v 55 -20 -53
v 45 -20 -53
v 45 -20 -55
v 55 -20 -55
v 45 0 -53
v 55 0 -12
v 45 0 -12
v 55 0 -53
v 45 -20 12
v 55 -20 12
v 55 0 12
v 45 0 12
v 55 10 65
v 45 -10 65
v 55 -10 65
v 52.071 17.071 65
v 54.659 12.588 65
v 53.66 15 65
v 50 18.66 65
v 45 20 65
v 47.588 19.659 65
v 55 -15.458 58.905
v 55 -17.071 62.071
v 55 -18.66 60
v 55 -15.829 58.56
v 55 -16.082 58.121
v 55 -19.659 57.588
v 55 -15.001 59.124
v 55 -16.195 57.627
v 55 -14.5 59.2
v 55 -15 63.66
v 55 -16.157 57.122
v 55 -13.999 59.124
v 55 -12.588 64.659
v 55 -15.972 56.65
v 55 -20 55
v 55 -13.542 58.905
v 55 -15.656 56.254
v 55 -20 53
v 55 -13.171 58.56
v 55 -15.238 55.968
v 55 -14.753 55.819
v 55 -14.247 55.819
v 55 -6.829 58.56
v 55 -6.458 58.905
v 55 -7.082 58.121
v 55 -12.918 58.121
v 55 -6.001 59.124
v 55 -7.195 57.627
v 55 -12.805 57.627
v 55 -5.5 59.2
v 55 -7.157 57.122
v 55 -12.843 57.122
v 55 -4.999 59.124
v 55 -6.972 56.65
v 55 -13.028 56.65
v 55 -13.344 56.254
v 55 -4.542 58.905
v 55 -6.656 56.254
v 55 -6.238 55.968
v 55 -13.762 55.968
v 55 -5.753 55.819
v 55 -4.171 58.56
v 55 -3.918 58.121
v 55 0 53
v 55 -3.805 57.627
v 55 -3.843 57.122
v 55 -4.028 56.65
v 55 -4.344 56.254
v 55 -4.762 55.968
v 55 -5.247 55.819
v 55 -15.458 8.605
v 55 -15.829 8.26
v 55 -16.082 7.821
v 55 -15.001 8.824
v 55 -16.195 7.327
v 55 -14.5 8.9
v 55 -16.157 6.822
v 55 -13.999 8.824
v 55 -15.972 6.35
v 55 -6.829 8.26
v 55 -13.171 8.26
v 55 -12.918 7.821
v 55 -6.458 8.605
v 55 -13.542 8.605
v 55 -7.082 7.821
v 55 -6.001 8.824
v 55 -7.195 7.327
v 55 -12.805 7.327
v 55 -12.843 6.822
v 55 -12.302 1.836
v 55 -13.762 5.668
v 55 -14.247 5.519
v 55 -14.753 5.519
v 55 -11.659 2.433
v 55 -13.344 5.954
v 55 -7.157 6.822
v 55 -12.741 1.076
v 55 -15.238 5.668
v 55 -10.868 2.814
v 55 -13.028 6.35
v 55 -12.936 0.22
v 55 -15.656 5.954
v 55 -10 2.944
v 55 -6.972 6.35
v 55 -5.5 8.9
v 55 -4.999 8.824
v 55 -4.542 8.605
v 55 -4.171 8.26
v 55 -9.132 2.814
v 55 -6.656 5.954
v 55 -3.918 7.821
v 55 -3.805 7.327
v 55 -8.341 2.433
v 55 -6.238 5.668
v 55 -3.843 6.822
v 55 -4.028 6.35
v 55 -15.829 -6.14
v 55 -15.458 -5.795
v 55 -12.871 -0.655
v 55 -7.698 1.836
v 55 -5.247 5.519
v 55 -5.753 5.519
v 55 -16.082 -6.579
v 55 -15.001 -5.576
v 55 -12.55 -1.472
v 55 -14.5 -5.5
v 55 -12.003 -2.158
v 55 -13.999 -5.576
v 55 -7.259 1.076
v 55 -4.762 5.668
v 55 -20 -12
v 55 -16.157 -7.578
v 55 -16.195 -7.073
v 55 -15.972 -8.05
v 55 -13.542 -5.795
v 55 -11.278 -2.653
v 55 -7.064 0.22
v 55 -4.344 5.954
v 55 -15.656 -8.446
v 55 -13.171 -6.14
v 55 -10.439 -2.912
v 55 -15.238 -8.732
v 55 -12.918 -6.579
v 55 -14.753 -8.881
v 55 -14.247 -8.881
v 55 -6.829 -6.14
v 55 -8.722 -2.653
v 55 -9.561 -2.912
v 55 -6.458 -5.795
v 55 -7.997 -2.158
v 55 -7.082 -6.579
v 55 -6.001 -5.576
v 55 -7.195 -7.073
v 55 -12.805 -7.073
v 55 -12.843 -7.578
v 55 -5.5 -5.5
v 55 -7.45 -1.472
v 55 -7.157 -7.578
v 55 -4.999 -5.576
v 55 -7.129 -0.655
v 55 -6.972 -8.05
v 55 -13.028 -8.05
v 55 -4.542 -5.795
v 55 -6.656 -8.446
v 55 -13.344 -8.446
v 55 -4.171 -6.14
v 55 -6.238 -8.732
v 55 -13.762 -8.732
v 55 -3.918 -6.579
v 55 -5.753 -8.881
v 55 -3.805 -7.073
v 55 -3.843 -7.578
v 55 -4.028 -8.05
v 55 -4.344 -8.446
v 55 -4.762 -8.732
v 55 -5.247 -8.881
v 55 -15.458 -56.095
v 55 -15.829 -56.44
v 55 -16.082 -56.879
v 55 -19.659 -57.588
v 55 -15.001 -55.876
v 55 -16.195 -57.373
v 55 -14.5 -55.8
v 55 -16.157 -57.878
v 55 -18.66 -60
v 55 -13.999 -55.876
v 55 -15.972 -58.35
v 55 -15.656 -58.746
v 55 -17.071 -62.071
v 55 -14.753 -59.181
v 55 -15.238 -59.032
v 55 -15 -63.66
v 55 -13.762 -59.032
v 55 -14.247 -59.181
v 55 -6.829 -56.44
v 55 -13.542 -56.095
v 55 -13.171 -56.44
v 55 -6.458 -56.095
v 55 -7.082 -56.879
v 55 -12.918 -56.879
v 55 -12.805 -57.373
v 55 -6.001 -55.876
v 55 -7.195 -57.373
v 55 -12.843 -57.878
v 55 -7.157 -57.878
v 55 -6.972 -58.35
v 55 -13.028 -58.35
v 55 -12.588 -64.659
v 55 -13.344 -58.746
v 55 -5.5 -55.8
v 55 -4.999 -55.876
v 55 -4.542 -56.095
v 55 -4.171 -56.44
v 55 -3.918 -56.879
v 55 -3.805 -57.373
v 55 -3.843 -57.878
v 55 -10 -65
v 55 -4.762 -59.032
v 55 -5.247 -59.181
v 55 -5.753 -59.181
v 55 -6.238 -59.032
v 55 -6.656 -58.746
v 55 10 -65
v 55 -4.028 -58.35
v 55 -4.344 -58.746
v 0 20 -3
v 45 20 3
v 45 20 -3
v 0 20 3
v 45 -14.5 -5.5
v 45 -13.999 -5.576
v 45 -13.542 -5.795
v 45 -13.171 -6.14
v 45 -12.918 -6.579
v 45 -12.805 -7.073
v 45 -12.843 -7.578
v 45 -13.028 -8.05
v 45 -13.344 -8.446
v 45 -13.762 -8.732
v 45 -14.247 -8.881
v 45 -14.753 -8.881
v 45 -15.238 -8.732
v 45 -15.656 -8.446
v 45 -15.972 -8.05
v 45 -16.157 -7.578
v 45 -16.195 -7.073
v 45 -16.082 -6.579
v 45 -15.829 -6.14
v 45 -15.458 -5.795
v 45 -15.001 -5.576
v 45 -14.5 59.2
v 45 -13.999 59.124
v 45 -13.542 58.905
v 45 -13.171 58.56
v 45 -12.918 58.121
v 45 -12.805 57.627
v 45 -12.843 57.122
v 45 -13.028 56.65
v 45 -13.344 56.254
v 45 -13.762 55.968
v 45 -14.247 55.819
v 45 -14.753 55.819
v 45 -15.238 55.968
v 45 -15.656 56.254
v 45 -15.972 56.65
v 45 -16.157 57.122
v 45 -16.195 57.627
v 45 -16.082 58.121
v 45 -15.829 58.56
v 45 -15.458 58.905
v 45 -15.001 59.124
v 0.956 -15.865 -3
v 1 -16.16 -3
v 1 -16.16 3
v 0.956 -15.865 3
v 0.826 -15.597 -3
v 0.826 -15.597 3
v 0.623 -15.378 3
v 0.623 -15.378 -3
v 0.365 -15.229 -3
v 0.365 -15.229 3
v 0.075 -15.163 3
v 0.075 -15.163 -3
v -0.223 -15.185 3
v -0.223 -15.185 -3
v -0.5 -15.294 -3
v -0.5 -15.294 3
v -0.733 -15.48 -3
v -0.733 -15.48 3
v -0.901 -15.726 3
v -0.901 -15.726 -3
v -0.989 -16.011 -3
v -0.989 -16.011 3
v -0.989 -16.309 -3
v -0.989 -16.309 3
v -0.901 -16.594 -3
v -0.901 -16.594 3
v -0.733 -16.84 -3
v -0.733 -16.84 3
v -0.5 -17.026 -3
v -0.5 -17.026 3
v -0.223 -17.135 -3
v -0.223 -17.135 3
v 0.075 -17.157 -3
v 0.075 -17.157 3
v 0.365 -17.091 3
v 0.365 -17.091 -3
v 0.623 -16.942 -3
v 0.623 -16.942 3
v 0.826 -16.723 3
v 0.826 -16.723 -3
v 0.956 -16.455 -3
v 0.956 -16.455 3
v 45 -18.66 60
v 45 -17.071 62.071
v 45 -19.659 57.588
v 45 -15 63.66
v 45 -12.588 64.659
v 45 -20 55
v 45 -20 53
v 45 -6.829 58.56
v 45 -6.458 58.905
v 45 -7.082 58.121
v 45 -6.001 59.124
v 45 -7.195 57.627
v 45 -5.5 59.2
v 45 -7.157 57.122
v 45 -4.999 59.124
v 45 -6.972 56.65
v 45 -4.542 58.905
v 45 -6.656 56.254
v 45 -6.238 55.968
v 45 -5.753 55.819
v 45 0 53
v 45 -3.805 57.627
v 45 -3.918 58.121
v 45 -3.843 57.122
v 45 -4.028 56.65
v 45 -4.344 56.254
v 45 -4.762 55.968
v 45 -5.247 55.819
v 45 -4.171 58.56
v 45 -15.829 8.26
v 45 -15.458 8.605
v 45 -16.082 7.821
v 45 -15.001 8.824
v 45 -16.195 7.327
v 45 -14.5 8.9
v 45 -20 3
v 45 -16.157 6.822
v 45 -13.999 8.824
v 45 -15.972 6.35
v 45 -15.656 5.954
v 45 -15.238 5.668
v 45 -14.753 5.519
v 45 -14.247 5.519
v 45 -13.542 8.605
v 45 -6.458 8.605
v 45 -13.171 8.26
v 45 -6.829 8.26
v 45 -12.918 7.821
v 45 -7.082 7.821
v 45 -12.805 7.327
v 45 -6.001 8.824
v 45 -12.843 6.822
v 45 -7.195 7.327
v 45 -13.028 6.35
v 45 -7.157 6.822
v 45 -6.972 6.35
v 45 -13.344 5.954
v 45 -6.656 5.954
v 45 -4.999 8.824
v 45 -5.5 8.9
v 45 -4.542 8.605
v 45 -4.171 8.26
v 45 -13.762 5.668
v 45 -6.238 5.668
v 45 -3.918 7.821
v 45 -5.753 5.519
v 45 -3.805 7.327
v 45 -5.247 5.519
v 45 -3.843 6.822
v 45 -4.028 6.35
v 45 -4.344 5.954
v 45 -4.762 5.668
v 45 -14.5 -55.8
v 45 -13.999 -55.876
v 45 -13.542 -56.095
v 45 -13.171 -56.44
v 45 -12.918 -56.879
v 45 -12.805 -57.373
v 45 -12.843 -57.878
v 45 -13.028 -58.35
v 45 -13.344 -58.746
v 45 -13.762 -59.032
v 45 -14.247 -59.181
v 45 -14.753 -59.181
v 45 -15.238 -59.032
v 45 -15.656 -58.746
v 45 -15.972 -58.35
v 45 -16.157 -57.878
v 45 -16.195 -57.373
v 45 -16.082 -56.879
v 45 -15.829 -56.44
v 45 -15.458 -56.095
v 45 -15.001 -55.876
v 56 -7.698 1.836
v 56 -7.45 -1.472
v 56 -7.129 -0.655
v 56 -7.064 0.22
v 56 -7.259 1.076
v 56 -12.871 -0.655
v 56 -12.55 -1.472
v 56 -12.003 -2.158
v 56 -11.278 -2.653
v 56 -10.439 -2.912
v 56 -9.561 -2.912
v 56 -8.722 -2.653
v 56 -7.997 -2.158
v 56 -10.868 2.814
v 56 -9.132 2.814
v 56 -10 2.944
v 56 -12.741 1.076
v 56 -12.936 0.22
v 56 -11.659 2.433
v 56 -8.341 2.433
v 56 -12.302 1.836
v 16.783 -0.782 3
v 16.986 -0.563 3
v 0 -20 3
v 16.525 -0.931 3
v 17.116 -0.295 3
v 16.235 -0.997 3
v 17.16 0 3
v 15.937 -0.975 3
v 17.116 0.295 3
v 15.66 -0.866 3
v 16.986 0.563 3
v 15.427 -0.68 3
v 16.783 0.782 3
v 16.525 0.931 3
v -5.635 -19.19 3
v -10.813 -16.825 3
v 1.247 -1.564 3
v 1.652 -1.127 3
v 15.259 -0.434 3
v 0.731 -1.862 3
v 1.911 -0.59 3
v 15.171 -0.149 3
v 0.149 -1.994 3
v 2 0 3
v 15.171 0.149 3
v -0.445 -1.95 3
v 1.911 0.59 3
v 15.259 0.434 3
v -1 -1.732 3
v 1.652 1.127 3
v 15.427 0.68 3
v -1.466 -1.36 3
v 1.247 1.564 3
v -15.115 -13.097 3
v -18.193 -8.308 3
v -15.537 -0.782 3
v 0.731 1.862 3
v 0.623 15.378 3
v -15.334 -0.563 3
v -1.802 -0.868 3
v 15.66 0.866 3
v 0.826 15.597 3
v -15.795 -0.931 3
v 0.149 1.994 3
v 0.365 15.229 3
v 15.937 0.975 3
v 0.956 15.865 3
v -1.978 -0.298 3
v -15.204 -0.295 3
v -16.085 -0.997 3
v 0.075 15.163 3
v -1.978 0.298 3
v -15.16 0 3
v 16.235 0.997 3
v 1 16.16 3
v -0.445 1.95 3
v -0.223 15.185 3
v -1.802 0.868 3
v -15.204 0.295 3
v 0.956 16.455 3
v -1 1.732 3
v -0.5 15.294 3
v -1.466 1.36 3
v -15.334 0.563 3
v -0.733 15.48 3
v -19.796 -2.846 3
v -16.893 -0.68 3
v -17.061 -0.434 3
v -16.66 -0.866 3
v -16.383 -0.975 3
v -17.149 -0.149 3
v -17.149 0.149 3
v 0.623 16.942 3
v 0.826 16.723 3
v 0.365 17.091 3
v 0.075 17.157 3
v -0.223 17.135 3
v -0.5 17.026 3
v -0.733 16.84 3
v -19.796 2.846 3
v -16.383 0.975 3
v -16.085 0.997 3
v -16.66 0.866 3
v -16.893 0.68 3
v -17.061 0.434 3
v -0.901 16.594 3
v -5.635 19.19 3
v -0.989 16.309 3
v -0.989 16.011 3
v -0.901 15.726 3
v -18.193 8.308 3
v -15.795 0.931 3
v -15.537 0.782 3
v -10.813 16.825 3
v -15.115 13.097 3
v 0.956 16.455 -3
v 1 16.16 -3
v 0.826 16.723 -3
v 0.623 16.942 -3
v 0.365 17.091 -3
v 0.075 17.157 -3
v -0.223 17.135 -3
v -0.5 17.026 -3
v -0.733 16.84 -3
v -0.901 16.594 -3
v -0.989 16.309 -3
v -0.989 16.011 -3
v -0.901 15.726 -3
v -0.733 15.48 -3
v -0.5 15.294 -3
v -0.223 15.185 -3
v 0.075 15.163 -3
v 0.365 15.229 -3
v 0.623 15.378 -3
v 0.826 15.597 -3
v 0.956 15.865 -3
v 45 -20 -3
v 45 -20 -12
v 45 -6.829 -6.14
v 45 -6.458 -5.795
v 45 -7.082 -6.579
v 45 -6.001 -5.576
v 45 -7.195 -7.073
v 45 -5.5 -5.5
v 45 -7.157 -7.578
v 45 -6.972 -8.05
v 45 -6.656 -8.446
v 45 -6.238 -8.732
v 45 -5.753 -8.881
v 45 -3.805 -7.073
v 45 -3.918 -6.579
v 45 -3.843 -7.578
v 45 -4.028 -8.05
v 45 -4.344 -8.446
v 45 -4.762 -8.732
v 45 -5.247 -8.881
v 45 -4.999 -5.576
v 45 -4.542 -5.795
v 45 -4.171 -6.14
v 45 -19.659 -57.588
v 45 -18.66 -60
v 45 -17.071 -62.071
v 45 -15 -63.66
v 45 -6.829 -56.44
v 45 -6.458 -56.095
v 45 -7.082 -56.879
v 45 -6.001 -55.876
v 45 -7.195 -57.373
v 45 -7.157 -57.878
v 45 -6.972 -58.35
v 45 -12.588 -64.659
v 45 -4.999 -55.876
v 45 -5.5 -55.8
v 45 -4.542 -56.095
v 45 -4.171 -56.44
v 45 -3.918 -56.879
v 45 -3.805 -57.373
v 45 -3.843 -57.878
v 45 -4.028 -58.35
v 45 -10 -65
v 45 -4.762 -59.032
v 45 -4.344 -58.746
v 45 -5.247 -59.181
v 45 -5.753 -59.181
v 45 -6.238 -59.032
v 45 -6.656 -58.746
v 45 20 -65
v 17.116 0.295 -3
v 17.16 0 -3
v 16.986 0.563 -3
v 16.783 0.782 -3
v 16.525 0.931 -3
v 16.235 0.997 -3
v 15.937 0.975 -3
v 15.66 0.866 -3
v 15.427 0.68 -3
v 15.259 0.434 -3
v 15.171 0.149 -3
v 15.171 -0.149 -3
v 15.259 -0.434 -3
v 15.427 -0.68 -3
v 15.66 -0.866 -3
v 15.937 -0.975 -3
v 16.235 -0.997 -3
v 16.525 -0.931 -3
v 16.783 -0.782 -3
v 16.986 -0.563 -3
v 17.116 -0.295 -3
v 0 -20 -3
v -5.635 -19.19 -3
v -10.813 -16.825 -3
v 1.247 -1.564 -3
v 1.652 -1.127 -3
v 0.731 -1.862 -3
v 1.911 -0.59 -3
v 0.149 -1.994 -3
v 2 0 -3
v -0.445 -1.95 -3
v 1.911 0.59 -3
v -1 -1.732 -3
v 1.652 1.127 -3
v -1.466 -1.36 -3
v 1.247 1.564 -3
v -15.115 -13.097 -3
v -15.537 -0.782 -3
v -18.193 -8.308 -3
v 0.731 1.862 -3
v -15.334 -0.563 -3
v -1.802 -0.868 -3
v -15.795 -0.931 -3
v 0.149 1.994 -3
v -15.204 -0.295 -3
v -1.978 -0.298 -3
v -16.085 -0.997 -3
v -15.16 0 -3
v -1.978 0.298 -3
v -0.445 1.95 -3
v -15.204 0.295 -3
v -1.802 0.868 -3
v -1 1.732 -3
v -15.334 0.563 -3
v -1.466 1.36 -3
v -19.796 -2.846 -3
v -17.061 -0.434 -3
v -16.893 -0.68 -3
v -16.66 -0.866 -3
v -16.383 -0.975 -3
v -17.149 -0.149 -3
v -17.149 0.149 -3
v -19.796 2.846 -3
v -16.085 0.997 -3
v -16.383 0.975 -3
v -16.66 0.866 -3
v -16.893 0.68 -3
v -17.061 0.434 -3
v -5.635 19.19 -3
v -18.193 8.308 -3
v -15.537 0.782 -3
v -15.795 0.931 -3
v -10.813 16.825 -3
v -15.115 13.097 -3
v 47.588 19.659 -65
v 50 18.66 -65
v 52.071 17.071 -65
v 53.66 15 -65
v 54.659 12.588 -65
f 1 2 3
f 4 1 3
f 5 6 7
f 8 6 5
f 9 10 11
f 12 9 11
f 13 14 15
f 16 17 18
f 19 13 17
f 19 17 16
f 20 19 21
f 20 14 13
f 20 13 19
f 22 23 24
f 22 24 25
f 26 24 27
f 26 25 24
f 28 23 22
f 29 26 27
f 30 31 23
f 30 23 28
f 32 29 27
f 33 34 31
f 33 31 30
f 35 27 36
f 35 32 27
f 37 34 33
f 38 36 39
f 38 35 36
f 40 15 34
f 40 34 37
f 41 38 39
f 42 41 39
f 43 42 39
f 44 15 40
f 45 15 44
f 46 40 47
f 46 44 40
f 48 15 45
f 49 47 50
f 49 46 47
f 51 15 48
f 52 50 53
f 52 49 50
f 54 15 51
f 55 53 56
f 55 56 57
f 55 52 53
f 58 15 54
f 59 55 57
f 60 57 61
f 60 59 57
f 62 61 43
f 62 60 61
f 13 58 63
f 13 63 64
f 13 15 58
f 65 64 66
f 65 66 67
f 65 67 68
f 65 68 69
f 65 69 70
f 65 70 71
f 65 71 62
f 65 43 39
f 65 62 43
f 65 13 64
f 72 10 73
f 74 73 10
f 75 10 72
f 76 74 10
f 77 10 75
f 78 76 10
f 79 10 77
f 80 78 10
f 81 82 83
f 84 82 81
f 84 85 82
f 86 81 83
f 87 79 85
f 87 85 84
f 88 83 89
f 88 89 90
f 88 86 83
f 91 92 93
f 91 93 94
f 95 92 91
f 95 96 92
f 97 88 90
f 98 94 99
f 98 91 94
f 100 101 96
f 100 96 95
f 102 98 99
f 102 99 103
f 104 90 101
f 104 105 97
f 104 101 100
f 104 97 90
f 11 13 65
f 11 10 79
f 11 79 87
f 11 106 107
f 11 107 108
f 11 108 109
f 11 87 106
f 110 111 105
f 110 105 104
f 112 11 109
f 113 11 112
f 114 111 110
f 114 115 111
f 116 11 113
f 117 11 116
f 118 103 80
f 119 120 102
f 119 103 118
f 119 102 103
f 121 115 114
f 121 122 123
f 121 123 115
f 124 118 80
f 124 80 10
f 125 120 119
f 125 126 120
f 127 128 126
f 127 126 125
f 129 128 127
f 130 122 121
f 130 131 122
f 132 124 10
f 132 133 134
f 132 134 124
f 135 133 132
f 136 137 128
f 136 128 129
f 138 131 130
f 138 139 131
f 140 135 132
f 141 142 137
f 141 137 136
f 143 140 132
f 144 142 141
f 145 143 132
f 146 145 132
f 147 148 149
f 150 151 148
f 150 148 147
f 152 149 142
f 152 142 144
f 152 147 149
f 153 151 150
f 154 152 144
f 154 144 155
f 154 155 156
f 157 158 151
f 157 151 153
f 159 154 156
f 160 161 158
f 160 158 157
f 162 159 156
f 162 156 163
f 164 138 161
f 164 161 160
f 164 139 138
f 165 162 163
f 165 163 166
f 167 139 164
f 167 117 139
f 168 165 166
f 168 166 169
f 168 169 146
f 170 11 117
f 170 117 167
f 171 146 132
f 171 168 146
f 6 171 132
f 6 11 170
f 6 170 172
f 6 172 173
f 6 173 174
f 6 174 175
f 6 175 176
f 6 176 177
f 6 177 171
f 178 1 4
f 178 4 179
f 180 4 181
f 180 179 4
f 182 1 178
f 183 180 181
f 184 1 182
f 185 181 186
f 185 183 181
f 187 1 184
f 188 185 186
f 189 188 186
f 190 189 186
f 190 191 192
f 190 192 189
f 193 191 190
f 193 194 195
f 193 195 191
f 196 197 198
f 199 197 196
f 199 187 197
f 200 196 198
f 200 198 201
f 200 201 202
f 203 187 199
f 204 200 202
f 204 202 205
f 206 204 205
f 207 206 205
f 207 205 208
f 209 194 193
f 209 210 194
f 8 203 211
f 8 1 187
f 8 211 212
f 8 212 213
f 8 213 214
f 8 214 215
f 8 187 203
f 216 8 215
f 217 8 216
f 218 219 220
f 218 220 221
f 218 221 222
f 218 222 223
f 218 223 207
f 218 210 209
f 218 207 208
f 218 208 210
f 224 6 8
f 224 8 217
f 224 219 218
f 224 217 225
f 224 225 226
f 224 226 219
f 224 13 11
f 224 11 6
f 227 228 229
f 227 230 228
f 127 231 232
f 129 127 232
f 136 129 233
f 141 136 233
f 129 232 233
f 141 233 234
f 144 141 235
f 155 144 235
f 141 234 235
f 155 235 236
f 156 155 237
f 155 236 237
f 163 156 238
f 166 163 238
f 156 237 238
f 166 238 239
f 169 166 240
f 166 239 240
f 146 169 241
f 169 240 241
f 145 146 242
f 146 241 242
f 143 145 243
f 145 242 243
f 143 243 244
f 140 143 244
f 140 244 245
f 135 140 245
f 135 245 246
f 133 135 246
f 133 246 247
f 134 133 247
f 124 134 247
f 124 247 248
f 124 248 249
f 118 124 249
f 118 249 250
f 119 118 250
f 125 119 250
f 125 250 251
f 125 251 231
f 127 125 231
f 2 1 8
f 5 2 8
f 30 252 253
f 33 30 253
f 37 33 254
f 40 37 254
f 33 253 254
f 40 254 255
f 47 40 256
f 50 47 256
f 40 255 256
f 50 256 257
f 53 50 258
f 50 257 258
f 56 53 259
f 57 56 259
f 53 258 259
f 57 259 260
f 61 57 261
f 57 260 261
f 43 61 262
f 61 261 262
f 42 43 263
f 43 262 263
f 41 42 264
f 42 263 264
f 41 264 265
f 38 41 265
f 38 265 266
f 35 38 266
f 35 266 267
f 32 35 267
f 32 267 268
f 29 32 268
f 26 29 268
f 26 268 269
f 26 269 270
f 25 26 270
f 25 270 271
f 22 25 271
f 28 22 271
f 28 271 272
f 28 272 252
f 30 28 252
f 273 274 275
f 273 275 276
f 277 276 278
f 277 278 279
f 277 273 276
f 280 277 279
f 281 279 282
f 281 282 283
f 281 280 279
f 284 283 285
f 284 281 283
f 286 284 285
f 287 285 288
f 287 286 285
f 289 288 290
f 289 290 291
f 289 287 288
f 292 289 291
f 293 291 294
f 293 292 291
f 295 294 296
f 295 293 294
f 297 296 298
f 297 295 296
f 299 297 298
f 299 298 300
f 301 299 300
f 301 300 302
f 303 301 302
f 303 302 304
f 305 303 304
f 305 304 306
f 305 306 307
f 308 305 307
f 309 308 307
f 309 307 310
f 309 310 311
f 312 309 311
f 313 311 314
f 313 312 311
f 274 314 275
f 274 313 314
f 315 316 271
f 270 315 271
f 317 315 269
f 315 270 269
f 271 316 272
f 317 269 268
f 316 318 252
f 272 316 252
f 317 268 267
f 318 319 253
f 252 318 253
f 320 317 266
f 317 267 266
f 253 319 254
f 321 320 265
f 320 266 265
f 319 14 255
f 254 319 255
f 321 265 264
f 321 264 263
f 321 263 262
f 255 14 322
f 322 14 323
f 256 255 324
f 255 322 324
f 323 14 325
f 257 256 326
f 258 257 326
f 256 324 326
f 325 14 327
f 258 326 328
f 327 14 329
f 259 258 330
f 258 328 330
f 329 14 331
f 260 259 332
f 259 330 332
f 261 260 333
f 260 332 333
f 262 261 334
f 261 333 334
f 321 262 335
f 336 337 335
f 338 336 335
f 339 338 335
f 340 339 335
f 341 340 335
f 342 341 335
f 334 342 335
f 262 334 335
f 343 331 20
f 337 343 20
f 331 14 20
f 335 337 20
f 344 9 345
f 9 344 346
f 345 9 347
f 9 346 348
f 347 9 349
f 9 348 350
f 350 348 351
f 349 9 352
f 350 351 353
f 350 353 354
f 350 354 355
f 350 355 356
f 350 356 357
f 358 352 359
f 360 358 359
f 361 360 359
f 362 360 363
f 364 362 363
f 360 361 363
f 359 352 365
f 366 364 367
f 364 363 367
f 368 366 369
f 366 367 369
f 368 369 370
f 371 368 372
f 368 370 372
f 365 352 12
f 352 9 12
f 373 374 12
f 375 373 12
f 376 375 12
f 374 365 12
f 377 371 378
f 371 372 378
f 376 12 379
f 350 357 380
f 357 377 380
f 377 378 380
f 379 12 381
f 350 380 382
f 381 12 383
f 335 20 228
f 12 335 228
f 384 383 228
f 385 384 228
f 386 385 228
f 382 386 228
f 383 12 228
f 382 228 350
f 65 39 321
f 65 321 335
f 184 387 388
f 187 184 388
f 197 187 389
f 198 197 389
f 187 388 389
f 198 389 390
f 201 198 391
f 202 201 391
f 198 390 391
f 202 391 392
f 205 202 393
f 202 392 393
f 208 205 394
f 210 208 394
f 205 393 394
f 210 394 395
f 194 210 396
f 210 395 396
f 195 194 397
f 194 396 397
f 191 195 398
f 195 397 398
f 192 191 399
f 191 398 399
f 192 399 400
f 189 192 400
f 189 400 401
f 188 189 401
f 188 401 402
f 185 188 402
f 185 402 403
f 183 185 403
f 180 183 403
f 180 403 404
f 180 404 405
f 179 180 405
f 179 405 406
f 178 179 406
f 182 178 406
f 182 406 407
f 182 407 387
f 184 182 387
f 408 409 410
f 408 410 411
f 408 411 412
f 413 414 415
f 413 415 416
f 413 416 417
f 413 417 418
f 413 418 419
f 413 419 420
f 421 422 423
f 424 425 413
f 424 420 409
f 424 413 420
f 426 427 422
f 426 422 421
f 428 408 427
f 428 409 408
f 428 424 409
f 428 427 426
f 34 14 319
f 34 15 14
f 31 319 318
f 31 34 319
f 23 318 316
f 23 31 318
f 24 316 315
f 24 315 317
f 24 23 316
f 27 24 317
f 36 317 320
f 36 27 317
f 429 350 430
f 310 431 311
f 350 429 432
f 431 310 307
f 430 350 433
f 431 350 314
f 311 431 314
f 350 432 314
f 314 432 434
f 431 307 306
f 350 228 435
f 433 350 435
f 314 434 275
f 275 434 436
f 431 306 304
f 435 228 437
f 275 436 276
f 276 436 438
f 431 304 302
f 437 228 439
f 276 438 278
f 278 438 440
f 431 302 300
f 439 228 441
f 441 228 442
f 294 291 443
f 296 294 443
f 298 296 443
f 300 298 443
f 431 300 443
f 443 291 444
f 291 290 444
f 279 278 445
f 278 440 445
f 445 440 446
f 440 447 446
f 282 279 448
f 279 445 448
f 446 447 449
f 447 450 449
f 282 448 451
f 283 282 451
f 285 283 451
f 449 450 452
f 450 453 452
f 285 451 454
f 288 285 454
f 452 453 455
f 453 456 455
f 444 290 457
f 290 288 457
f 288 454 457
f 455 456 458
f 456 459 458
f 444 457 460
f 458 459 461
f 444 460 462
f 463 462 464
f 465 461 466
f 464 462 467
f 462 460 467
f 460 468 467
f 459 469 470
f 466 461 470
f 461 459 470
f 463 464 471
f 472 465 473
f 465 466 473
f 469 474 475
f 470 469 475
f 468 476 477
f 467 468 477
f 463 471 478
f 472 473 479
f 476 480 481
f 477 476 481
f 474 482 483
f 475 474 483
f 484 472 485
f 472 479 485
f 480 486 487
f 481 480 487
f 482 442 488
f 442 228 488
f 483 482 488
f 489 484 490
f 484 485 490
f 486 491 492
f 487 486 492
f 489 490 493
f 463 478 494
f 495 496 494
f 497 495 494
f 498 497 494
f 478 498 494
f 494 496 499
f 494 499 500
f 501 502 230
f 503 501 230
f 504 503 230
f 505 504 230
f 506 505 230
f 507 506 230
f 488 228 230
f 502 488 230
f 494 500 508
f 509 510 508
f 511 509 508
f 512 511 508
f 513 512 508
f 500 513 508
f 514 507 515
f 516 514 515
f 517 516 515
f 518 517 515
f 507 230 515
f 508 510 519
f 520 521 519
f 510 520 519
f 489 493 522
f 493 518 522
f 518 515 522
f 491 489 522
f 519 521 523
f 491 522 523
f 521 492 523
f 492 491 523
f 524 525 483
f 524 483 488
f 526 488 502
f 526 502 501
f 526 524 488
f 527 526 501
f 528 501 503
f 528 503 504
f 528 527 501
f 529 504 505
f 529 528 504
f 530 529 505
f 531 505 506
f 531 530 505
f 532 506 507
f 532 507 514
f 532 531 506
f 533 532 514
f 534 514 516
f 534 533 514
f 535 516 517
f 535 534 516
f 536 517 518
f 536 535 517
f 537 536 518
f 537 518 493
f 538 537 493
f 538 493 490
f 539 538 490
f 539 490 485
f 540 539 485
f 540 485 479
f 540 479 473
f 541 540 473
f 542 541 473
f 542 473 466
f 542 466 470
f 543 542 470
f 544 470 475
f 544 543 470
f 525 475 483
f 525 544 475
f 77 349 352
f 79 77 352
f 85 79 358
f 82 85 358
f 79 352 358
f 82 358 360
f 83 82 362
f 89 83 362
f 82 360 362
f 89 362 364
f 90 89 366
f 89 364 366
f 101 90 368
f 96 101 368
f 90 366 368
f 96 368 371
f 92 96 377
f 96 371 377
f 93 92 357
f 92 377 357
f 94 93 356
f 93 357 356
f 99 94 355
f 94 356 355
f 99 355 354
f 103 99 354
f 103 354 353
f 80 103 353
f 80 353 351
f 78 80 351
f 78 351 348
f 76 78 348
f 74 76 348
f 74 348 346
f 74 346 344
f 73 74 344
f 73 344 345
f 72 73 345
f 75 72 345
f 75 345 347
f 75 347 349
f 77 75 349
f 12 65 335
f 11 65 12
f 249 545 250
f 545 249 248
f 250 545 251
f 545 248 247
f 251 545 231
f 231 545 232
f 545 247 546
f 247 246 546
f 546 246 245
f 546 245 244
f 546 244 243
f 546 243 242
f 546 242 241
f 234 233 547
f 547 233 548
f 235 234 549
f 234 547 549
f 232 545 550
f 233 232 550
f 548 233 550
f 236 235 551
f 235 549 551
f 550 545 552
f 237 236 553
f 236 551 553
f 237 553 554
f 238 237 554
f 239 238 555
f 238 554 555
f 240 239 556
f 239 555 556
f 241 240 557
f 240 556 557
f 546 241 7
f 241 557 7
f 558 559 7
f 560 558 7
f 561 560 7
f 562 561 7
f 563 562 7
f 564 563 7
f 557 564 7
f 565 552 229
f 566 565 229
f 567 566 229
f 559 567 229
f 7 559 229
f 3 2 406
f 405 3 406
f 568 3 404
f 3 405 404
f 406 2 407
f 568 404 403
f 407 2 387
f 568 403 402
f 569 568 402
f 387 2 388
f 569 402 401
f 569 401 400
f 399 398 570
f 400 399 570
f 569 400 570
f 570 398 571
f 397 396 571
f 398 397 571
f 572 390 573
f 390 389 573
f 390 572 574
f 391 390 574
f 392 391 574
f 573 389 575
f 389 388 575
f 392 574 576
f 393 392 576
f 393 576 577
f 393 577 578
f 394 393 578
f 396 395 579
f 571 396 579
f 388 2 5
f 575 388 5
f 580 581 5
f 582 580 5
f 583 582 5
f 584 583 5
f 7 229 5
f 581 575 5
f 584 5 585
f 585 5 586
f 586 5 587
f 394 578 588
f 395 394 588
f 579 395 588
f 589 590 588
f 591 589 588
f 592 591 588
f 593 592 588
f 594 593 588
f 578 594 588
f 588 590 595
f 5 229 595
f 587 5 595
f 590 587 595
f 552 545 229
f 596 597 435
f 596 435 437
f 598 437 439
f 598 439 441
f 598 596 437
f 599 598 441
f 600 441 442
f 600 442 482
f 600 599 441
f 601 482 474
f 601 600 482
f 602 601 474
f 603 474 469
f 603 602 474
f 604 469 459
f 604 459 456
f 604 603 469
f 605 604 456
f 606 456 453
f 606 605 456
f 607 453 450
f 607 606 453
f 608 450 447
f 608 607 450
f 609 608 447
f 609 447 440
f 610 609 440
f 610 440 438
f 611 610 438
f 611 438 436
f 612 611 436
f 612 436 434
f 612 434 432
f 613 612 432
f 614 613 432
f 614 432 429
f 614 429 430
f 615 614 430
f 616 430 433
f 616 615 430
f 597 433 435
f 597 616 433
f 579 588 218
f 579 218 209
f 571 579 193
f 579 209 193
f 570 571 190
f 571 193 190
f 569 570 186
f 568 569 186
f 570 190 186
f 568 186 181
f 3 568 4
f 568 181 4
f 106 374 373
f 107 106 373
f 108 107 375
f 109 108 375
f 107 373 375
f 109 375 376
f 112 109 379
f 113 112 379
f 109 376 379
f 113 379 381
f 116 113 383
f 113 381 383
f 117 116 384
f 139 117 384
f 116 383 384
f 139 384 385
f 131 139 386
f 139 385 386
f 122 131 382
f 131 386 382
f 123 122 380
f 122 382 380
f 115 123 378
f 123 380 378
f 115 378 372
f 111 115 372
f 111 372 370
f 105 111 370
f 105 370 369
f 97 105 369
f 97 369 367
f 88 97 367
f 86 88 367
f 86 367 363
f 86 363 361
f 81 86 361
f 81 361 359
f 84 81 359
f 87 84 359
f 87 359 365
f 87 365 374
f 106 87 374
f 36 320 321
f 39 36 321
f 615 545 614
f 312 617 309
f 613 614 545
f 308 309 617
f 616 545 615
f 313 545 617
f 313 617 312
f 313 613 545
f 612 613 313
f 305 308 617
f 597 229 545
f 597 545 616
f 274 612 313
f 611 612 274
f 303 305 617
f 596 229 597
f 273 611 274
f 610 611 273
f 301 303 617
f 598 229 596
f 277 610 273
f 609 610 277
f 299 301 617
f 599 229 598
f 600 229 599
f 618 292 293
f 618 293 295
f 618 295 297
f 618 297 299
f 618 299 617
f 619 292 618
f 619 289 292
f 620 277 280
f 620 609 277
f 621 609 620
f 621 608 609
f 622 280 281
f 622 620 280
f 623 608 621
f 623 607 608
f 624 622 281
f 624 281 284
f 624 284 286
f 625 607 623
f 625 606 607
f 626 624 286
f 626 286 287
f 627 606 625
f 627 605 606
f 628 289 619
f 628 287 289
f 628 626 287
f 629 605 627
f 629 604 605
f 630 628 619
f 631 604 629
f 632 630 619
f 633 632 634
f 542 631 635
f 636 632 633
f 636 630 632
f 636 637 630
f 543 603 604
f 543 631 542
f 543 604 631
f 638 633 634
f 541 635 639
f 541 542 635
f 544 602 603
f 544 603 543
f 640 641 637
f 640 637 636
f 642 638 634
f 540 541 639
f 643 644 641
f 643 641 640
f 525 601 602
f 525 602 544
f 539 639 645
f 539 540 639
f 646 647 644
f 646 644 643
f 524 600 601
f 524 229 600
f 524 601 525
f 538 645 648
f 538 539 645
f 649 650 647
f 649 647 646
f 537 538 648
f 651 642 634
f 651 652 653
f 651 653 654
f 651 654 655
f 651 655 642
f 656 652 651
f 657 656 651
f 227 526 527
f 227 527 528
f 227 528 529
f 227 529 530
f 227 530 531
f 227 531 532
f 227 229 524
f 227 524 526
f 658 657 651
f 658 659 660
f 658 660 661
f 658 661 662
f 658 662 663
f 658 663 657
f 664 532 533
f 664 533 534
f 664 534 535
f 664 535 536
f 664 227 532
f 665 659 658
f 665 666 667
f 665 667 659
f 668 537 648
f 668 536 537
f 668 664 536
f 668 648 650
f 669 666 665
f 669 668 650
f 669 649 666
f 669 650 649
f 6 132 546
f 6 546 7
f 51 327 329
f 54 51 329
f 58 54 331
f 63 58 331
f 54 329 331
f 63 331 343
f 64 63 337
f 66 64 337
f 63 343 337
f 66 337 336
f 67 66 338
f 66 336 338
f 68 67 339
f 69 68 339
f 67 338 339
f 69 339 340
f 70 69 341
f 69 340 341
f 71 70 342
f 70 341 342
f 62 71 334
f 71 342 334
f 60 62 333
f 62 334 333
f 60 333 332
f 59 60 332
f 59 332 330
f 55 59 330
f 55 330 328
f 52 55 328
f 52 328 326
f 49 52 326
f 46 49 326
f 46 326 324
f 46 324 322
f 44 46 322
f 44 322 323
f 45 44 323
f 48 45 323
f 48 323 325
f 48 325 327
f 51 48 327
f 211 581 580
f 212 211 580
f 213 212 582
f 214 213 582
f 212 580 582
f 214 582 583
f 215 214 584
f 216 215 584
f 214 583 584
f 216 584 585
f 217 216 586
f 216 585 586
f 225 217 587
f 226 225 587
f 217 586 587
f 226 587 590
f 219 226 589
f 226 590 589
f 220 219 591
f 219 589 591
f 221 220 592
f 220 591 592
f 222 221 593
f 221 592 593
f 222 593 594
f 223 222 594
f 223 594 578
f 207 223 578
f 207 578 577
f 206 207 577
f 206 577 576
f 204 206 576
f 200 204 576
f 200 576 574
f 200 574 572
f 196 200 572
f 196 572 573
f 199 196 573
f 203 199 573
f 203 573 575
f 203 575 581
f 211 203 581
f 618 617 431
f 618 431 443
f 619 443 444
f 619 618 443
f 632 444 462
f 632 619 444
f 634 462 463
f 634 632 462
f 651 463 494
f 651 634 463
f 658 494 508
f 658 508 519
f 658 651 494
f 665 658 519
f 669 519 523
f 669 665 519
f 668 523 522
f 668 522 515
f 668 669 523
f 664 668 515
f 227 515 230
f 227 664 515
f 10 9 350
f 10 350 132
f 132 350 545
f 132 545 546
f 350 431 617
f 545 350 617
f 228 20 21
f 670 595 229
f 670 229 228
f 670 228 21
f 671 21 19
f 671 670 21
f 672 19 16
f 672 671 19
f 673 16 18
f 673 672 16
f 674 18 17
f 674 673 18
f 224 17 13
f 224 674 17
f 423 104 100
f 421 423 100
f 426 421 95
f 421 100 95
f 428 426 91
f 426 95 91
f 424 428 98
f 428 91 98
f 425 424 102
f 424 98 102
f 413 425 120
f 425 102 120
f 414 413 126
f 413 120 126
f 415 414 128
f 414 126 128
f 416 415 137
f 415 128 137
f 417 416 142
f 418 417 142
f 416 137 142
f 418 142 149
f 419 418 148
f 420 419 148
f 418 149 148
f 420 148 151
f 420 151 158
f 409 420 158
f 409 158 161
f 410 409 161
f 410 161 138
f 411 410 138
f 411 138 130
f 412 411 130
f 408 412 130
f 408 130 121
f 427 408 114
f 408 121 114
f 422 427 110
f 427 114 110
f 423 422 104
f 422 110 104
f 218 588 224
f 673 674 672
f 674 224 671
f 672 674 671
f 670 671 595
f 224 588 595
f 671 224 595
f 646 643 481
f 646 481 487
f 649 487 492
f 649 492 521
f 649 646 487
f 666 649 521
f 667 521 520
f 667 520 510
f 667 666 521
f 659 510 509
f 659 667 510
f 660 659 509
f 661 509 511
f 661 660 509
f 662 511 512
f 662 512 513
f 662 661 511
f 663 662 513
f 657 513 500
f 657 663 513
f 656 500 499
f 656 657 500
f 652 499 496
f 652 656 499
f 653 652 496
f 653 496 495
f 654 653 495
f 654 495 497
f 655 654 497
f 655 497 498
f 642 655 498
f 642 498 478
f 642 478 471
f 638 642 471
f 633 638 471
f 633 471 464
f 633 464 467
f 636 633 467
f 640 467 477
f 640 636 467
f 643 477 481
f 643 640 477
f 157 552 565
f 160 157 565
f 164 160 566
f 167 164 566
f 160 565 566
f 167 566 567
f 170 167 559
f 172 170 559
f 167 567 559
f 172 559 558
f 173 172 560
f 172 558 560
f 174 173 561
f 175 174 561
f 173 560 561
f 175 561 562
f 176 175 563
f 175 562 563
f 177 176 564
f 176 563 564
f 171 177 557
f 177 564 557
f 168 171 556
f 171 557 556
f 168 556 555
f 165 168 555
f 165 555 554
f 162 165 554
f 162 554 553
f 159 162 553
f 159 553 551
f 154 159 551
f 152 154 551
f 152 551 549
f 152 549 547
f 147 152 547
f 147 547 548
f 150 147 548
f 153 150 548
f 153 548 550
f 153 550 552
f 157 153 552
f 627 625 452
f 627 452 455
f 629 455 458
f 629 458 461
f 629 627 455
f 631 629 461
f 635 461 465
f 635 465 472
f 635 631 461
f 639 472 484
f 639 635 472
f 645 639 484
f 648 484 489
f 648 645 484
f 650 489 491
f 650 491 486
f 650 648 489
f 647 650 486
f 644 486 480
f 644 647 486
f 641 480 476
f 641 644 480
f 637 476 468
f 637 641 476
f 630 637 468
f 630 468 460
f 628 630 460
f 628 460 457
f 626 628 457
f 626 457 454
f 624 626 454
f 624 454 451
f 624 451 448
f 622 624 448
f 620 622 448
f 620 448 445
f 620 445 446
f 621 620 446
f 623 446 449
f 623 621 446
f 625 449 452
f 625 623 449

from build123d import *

# Parameters (mm, degrees)
EXTRUDE_1_DEPTH      = 3
EXTRUDE_1_DEPTH_BACK = 3
SKETCH_1_R           = 2
SKETCH_1_R_2         = 1
SKETCH_2_W           = 130
SKETCH_2_H           = 40
EXTRUDE_2_DEPTH      = 10
SKETCH_3_W           = 41
SKETCH_3_H           = 20
CUT_EXTRUDE_1_DEPTH  = 10
FILLET_1_R           = 10
HOLE_WIZARD_M3_1_D   = 3.4
FILLET_4_R           = 10
SKETCH_6_R           = 2.944419646
EXTRUDE_3_DEPTH      = 1


with BuildPart() as part:
    # 스케치1 → 보스-돌출1 (new, two sides: drawn at the far end of the back side and taken through both)
    with BuildSketch(Plane.XY.offset(-EXTRUDE_1_DEPTH_BACK)):
        with BuildLine():
            Line((0, 20), (45, 20))
            Line((45, 20), (45, -20))
            Line((45, -20), (0, -20))
            ThreePointArc((0, -20), (-20, 0), (0, 20))
        make_face()
        Circle(SKETCH_1_R, mode=Mode.SUBTRACT)
        with Locations((0, 16.16)):
            Circle(SKETCH_1_R_2, mode=Mode.SUBTRACT)
        with Locations((16.16, 0)):
            Circle(SKETCH_1_R_2, mode=Mode.SUBTRACT)
        with Locations((0, -16.16)):
            Circle(SKETCH_1_R_2, mode=Mode.SUBTRACT)
        with Locations((-16.16, 0)):
            Circle(SKETCH_1_R_2, mode=Mode.SUBTRACT)
    extrude(amount=EXTRUDE_1_DEPTH + EXTRUDE_1_DEPTH_BACK)

    # 스케치2 → 보스-돌출2 (add)
    with BuildSketch(Plane(origin=(45, 0, 0), x_dir=(0, 0, -1), z_dir=(1, 0, 0))):
        Rectangle(SKETCH_2_W, SKETCH_2_H)
    extrude(amount=EXTRUDE_2_DEPTH)

    # 스케치3 → 컷-돌출1 (cut)
    with BuildSketch(Plane(origin=(55, 0, 0), x_dir=(0, 0, -1), z_dir=(1, 0, 0))):
        with Locations((32.5, -10)):
            Rectangle(SKETCH_3_W, SKETCH_3_H)
        with Locations((-32.5, -10)):
            Rectangle(SKETCH_3_W, SKETCH_3_H)
    extrude(amount=-CUT_EXTRUDE_1_DEPTH, mode=Mode.SUBTRACT)

    # 필렛1
    fillet_1_edges = [part.edges().sort_by_distance(p)[0] for p in [
        (55, 20, 0),
    ]]
    fillet(fillet_1_edges, radius=FILLET_1_R)

    # M3 여유 구멍1 (through all)
    with Locations(Plane(origin=(55, 0, 0), x_dir=(0, 0, -1), z_dir=(1, 0, 0))):
        with Locations((-57.5, -5.5), (-57.5, -14.5), (-7.2, -5.5), (-7.2, -14.5), (7.2, -5.5), (7.2, -14.5), (57.5, -5.5), (57.5, -14.5)):
            Hole(HOLE_WIZARD_M3_1_D / 2)

    # 필렛4
    fillet_4_edges = [part.edges().sort_by_distance(p)[0] for p in [
        (50, -20, -65),
        (50, -20, 65),
    ]]
    fillet(fillet_4_edges, radius=FILLET_4_R)

    # 스케치6 → 보스-돌출3 (add)
    with BuildSketch(Plane(origin=(55, 0, 0), x_dir=(0, 0, -1), z_dir=(1, 0, 0))):
        with Locations(Location((0, -10, 0), (0, 0, 180))):
            Circle(SKETCH_6_R)
    extrude(amount=EXTRUDE_3_DEPTH)


solid = part.part
